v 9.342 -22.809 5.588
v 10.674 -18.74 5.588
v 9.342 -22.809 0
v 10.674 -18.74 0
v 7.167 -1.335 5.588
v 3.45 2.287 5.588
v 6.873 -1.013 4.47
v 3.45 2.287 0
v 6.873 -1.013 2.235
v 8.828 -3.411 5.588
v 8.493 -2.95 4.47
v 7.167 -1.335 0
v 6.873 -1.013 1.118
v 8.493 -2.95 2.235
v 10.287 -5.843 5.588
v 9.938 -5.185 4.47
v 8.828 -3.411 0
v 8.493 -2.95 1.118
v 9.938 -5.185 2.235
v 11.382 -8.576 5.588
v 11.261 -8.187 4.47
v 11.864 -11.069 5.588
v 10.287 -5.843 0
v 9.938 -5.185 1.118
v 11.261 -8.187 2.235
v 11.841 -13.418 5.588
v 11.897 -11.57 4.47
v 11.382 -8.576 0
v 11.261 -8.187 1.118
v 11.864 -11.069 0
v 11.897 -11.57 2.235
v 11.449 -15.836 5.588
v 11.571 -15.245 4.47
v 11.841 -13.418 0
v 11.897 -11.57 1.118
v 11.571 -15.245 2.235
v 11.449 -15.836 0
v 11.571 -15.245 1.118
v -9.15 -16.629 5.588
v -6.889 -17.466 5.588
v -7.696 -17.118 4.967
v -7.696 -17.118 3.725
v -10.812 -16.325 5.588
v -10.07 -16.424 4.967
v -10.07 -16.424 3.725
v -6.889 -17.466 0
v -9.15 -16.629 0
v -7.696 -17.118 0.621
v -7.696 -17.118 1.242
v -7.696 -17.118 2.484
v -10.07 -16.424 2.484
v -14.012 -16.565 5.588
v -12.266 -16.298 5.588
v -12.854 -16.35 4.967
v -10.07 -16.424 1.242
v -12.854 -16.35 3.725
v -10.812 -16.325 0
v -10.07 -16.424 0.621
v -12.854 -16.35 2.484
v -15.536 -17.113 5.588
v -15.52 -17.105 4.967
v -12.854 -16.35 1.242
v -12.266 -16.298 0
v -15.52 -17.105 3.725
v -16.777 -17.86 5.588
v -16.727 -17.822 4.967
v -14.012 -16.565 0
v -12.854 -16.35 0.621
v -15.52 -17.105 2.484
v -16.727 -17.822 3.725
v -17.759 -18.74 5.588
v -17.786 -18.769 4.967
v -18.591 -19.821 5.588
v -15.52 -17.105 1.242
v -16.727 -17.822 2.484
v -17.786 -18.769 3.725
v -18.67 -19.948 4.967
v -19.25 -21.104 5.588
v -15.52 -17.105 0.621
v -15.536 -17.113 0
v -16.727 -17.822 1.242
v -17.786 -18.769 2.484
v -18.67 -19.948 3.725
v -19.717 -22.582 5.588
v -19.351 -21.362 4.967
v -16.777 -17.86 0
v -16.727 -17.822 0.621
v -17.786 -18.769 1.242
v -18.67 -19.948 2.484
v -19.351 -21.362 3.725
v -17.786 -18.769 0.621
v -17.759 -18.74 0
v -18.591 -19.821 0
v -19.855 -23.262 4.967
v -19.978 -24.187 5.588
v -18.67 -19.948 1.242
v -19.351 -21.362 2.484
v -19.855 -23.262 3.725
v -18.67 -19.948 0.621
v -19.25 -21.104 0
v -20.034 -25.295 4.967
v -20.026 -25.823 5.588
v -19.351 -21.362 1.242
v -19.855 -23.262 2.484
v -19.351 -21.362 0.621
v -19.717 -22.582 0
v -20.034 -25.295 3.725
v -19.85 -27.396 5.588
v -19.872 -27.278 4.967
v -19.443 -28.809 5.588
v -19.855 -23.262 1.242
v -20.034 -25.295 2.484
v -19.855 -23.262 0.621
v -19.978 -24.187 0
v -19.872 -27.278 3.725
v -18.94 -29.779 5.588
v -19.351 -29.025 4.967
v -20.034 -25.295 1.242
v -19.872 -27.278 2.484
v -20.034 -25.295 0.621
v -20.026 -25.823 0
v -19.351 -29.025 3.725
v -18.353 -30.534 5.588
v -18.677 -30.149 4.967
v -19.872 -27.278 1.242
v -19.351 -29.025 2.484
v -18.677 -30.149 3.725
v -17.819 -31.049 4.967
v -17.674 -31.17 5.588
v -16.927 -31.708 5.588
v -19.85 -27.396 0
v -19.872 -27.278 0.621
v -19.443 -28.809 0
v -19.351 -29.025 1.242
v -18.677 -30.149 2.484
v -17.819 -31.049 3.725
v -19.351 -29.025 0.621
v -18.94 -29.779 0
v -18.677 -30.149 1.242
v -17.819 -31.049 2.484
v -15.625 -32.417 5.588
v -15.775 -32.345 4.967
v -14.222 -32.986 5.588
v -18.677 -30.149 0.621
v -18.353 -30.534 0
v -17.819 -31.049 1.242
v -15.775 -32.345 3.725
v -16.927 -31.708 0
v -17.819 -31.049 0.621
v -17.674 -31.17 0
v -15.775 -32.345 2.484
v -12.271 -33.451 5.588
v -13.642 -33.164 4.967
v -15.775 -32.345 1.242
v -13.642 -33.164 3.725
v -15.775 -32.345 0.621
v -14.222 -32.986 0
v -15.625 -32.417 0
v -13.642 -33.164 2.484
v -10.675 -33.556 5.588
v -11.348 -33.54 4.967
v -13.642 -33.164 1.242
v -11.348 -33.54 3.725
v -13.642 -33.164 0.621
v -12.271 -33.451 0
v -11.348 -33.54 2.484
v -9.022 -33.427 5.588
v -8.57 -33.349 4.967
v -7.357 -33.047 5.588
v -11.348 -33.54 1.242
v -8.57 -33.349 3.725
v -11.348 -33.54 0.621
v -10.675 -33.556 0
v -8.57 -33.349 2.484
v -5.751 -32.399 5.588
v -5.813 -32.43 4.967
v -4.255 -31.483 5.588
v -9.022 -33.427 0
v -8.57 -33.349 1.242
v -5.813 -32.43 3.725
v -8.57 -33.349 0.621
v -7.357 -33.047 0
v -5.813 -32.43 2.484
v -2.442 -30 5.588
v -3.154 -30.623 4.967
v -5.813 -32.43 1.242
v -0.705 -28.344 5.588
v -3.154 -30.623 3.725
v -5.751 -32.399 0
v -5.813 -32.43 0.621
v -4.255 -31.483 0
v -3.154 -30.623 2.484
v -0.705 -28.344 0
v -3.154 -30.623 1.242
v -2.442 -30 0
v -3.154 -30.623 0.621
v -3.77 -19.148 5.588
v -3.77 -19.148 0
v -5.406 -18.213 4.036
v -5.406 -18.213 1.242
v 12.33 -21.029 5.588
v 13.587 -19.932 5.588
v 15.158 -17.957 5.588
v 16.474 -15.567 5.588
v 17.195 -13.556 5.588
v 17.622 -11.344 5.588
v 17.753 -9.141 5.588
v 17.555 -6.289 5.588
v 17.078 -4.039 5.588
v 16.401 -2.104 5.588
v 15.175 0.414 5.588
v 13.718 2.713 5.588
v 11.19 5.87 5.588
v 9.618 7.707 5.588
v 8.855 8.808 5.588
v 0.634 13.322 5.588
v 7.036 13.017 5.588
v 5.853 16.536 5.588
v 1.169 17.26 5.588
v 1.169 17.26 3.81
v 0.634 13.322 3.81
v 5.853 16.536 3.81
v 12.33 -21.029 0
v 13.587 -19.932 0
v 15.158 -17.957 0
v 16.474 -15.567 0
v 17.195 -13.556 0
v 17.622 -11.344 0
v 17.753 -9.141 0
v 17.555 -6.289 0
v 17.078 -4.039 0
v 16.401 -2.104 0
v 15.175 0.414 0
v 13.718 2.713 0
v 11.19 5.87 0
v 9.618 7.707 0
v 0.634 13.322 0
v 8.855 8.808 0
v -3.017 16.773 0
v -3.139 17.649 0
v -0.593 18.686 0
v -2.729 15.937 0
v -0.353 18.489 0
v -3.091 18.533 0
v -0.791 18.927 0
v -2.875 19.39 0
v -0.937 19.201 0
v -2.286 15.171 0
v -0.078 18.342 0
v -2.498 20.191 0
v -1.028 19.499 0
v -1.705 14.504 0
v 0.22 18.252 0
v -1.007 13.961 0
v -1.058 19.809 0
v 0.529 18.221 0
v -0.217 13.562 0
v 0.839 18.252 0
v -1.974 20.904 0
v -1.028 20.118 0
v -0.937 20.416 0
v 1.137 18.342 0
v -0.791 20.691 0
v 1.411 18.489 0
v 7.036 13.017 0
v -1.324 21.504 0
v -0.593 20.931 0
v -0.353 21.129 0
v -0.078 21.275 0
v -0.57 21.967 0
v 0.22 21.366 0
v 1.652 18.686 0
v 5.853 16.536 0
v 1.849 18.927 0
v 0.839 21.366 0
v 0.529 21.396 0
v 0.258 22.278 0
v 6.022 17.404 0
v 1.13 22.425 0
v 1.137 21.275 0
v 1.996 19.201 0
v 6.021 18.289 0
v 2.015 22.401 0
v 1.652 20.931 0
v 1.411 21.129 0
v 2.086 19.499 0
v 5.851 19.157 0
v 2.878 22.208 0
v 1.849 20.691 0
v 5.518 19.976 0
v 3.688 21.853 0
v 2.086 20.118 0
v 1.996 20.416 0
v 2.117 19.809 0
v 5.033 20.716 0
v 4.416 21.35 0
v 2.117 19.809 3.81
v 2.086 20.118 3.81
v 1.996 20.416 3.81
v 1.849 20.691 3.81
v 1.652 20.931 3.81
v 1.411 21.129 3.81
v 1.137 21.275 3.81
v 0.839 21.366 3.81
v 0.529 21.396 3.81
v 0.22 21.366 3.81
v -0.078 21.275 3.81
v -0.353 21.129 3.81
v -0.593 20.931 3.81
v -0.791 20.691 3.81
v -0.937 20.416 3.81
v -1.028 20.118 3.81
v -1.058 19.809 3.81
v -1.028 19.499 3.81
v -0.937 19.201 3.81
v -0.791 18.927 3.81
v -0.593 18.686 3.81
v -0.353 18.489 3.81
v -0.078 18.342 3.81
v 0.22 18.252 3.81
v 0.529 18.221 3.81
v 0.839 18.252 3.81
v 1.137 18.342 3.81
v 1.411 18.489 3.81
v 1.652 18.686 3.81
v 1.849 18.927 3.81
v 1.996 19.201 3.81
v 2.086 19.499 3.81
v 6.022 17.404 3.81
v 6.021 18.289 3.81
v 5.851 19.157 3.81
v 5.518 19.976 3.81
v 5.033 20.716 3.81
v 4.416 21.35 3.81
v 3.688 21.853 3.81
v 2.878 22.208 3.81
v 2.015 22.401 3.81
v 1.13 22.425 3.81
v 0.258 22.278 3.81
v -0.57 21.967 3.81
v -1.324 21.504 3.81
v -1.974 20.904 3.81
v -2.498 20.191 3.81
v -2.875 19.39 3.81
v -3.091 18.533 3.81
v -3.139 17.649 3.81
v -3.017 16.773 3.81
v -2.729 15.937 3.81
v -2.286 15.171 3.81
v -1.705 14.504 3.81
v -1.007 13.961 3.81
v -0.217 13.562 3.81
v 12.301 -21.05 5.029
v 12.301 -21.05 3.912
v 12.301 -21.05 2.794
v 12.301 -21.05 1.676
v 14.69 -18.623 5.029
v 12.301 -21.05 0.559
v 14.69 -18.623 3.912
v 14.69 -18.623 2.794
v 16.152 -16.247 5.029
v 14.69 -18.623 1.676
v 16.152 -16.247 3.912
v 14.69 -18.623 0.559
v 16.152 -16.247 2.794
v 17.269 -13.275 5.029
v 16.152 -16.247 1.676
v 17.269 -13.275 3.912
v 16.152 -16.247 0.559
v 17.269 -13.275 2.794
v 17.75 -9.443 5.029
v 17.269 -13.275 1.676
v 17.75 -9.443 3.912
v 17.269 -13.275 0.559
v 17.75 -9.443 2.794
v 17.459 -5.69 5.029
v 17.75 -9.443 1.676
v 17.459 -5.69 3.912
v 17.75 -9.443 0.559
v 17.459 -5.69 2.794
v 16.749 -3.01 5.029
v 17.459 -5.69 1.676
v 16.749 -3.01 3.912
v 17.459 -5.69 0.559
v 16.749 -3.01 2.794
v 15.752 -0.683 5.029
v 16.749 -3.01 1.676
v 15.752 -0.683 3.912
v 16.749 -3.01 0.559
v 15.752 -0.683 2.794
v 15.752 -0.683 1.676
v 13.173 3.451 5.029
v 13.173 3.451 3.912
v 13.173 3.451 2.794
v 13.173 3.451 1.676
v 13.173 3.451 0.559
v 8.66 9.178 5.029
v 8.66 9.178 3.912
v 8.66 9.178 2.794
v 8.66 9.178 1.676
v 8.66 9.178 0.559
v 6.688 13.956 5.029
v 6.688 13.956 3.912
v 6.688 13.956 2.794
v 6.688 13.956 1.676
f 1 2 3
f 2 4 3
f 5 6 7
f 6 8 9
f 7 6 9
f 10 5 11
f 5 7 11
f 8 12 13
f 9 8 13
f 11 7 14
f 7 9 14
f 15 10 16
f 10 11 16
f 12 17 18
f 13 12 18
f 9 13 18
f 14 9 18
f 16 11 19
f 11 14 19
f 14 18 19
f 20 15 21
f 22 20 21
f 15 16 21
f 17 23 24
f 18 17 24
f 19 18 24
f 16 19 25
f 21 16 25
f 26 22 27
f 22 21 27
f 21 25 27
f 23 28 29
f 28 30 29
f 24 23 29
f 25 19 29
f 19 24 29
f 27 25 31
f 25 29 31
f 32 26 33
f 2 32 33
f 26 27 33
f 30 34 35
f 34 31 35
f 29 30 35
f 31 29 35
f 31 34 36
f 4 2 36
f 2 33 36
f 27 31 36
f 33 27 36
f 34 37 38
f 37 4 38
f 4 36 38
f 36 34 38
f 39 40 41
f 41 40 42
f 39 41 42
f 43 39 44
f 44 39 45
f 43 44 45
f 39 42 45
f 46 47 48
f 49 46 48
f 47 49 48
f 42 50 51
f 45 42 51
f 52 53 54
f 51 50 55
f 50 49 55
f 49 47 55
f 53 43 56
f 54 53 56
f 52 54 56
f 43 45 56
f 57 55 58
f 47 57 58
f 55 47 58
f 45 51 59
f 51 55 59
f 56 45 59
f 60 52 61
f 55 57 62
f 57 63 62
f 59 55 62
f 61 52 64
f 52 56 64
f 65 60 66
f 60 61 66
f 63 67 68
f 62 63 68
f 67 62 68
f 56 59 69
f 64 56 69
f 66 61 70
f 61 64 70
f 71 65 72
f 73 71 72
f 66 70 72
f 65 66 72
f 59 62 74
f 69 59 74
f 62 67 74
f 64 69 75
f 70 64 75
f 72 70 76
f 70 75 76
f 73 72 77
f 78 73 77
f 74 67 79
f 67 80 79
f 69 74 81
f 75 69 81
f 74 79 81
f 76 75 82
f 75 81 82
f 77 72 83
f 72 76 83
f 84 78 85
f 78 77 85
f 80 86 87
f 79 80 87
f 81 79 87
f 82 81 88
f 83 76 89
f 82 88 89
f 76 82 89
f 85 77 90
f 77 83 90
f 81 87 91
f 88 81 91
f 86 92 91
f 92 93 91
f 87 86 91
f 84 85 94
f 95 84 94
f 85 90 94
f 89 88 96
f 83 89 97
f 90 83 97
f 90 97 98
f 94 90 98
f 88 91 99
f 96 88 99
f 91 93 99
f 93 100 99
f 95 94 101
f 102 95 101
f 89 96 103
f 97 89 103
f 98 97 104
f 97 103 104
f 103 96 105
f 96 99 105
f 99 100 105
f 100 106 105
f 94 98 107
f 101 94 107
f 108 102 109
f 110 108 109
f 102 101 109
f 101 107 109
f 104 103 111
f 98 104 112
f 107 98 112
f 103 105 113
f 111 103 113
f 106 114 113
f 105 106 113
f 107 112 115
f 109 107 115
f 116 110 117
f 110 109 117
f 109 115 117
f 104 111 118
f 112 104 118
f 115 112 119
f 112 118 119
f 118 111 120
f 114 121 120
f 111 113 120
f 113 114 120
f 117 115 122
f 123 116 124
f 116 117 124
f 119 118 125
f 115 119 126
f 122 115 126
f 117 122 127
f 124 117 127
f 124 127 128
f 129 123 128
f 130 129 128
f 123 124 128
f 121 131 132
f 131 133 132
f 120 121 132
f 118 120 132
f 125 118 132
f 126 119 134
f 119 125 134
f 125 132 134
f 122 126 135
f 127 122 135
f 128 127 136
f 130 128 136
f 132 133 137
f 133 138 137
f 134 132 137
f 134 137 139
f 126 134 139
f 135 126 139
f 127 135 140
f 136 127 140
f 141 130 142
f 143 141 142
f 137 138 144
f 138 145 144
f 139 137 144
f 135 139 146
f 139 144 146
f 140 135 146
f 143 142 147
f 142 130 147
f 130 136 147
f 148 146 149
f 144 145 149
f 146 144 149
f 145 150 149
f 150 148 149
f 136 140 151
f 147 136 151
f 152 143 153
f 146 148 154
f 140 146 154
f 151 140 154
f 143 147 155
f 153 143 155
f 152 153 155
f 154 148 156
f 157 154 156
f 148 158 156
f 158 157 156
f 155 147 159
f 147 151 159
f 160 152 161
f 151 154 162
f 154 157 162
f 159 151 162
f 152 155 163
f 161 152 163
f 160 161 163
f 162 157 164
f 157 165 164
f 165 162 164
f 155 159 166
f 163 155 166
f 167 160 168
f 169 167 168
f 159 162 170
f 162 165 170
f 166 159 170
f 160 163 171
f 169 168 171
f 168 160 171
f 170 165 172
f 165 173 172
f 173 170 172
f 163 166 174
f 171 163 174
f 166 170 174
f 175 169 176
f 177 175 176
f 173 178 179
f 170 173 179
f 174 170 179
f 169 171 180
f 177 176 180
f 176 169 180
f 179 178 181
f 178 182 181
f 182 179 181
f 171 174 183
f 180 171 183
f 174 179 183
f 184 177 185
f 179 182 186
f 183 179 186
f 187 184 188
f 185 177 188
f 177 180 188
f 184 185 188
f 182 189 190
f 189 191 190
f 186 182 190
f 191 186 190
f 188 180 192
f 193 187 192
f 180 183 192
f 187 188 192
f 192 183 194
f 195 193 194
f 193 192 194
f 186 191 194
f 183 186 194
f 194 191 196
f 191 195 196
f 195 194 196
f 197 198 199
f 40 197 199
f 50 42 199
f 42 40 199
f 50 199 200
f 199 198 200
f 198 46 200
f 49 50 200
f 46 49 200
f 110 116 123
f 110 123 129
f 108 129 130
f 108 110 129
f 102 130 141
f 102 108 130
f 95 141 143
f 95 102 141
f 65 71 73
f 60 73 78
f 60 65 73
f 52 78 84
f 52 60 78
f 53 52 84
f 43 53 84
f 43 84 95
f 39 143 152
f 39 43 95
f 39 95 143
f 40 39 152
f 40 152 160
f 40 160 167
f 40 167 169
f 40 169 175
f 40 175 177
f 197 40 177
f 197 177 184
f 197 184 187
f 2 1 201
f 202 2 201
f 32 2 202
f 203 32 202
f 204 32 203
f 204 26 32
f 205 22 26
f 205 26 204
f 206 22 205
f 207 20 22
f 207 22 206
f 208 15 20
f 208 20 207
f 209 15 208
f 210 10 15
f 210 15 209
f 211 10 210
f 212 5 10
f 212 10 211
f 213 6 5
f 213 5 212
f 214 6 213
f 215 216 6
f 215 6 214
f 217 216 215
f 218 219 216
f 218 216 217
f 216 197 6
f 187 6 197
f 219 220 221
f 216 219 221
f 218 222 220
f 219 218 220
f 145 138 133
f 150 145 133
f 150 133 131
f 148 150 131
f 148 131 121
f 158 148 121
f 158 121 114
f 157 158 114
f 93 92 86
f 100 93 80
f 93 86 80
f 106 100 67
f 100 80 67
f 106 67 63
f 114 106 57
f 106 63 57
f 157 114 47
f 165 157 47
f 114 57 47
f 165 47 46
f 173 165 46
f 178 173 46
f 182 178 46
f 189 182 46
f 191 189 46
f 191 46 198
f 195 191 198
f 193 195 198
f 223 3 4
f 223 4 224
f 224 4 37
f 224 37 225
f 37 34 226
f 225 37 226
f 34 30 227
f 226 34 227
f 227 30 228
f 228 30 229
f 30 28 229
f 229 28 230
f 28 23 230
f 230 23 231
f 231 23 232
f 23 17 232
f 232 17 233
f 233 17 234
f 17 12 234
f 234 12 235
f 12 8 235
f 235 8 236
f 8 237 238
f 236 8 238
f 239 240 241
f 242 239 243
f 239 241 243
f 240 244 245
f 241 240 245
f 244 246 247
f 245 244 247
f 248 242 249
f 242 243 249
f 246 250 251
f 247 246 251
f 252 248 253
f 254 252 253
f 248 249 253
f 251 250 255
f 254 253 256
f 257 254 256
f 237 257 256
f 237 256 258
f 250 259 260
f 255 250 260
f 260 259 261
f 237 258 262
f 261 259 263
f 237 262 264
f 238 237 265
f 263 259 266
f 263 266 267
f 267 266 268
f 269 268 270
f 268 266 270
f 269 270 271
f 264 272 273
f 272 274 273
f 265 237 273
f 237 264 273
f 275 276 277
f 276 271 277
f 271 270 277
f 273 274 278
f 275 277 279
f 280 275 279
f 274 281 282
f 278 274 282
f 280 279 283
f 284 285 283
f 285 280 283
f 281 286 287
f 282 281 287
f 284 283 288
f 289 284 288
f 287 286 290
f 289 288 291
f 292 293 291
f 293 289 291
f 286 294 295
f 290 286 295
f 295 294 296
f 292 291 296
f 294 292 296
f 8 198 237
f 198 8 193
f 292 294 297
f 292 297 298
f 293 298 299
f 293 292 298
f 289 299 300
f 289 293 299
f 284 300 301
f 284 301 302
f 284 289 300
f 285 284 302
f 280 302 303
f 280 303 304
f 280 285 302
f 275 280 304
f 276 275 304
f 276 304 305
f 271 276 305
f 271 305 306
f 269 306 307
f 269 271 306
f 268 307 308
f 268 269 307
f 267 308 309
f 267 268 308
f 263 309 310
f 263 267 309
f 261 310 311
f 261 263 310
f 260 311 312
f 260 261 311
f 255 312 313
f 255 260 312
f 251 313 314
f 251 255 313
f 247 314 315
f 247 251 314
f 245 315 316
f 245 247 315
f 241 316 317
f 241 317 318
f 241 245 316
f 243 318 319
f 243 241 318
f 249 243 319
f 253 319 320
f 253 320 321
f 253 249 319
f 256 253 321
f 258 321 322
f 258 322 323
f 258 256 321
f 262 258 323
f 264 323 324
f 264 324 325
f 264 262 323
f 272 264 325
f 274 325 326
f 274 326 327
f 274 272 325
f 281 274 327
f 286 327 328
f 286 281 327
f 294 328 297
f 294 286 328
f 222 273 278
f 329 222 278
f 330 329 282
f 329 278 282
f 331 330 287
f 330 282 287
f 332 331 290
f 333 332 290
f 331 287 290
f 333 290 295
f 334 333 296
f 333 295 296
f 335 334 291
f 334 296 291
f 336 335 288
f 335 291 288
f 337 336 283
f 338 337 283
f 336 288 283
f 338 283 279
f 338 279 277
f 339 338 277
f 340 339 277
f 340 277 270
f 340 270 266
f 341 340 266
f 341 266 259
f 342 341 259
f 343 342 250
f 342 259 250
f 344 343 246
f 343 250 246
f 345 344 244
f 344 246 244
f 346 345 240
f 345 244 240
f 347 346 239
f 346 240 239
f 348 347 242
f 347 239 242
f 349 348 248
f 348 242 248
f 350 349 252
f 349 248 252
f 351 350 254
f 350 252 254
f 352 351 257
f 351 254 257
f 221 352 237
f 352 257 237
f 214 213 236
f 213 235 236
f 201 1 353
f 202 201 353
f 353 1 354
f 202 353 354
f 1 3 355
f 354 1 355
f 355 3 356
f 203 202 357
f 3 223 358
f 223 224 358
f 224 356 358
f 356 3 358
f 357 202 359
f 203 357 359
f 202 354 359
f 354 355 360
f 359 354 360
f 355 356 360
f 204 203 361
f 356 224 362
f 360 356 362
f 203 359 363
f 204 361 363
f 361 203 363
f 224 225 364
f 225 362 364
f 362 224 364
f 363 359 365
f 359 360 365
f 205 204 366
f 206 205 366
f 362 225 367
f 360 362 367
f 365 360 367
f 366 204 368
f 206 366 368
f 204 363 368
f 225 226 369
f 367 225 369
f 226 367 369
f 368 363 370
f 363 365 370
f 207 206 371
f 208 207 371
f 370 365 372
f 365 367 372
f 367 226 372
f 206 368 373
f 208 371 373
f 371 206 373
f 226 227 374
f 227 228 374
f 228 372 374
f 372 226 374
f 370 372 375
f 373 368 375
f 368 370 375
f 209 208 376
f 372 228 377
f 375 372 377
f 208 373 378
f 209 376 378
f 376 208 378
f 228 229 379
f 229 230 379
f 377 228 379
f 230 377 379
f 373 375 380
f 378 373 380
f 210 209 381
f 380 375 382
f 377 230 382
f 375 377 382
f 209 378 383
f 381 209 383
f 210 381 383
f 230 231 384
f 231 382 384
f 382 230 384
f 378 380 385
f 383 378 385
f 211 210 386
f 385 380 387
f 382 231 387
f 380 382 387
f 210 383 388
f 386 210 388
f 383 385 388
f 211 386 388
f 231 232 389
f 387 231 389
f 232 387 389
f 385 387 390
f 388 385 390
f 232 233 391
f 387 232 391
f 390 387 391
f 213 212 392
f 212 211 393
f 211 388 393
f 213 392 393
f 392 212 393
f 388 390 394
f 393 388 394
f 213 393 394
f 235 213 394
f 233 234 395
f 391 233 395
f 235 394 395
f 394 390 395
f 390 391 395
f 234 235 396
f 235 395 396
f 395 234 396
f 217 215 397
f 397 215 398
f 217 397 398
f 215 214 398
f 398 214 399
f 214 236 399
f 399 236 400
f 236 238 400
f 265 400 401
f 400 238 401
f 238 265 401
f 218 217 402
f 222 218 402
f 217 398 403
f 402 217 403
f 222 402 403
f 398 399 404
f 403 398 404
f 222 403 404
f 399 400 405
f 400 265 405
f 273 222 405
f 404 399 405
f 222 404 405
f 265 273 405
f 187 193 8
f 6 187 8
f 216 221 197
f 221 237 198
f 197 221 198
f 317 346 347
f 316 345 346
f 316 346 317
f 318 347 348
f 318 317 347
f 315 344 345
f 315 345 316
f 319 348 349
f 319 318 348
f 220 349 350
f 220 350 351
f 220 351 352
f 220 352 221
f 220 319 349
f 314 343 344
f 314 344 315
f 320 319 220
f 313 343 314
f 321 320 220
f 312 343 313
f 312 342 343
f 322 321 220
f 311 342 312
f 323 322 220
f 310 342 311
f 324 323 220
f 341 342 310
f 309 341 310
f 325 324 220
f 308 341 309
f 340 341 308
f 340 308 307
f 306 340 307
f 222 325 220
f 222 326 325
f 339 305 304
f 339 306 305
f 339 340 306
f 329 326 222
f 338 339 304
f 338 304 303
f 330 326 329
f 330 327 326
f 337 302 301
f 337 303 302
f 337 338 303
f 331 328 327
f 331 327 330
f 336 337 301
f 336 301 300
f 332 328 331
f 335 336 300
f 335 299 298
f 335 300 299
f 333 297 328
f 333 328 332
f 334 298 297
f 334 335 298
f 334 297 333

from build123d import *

# Parameters (mm, degrees)
F1_DEPTH = 5.588
F0_R     = 1.5875
F2_DEPTH = 3.81


with BuildPart() as f1:
    # F0 (on Top) → F1 (new body)
    with BuildSketch(Plane.XY):
        with BuildLine():
            Line((5.8533600532, 16.5355186909), (1.1685399804, 17.2595987498))
            Line((1.1685399804, 17.2595987498), (0.6344684199, 13.322157759))
            Line((0.6344684199, 13.322157759), (-3.7697718944, -19.1480908543))
            add(Edge.make_bspline(
                [(-3.7697718944, -19.1480908543), (-4.3555914665, -18.8016430905), (-5.7822178631, -17.9579506834), (-10.07942189, -15.9155984564), (-15.8703623677, -16.5296094496), (-20.1788042918, -20.9495015911), (-20.3416582915, -29.4957678975), (-15.8611889921, -32.5743524135), (-11.3658166935, -33.9344368989), (-5.4184186667, -32.9491526178), (-2.3140445763, -29.9160496434), (-0.7046127575, -28.3435676247)],
                knots=[0, 0, 0, 0, 0.0733716673, 0.1786795155, 0.2933199586, 0.4103962929, 0.5458171982, 0.653885502, 0.7586471083, 0.8748729978, 1, 1, 1, 1], degree=3))
            Line((-0.7046127575, -28.3435676247), (3.4501309904, 2.2872682951))
            add(Edge.make_bspline(
                [(3.4501309904, 2.2872682951), (4.6197476722, 1.2221385355), (7.0098302915, -0.9544276554), (10.2198450639, -5.0825493664), (12.6615847169, -11.5062056404), (10.7857675782, -18.6053580574), (9.7826652853, -21.5267447504), (9.3422969803, -22.8092521429)],
                knots=[0, 0, 0, 0, 0.1845963905, 0.3772181359, 0.5960105797, 0.8226460676, 1, 1, 1, 1], degree=3))
            add(Edge.make_bspline(
                [(9.3422969803, -22.8092521429), (10.3764018063, -22.2564735657), (12.4391825703, -21.153818412), (14.9121319585, -18.6603720305), (17.892394858, -13.345119646), (17.866540264, -5.6551098274), (15.8778206426, -0.6260222519), (13.4325832396, 3.3840169536), (9.7013106687, 7.5378647698), (8.6089736323, 9.0133392963), (6.6069778635, 14.002692023), (6.0762569166, 15.7863868205), (5.8533600532, 16.5355186909)],
                knots=[0, 0, 0, 0, 0.088190786, 0.1759185842, 0.2917429153, 0.4226818929, 0.5320046223, 0.6369322812, 0.746243833, 0.8136578164, 0.9217383665, 1, 1, 1, 1], degree=3))
        make_face()
    extrude(amount=F1_DEPTH)

    # F0 (on Top) → F2 (join)
    with BuildSketch(Plane.XY):
        with BuildLine():
            Line((0.6344684199, 13.322157759), (1.1685399804, 17.2595987498))
            Line((1.1685399804, 17.2595987498), (5.8533600532, 16.5355186909))
            ThreePointArc((5.8533600532, 16.5355186909), (-0.9582753649, 21.7537087006), (0.6344684199, 13.322157759))
        make_face()
        with Locations((0.5294481525, 19.8085624725)):
            Circle(F0_R, mode=Mode.SUBTRACT)
    extrude(amount=F2_DEPTH)


solid = f1.part
